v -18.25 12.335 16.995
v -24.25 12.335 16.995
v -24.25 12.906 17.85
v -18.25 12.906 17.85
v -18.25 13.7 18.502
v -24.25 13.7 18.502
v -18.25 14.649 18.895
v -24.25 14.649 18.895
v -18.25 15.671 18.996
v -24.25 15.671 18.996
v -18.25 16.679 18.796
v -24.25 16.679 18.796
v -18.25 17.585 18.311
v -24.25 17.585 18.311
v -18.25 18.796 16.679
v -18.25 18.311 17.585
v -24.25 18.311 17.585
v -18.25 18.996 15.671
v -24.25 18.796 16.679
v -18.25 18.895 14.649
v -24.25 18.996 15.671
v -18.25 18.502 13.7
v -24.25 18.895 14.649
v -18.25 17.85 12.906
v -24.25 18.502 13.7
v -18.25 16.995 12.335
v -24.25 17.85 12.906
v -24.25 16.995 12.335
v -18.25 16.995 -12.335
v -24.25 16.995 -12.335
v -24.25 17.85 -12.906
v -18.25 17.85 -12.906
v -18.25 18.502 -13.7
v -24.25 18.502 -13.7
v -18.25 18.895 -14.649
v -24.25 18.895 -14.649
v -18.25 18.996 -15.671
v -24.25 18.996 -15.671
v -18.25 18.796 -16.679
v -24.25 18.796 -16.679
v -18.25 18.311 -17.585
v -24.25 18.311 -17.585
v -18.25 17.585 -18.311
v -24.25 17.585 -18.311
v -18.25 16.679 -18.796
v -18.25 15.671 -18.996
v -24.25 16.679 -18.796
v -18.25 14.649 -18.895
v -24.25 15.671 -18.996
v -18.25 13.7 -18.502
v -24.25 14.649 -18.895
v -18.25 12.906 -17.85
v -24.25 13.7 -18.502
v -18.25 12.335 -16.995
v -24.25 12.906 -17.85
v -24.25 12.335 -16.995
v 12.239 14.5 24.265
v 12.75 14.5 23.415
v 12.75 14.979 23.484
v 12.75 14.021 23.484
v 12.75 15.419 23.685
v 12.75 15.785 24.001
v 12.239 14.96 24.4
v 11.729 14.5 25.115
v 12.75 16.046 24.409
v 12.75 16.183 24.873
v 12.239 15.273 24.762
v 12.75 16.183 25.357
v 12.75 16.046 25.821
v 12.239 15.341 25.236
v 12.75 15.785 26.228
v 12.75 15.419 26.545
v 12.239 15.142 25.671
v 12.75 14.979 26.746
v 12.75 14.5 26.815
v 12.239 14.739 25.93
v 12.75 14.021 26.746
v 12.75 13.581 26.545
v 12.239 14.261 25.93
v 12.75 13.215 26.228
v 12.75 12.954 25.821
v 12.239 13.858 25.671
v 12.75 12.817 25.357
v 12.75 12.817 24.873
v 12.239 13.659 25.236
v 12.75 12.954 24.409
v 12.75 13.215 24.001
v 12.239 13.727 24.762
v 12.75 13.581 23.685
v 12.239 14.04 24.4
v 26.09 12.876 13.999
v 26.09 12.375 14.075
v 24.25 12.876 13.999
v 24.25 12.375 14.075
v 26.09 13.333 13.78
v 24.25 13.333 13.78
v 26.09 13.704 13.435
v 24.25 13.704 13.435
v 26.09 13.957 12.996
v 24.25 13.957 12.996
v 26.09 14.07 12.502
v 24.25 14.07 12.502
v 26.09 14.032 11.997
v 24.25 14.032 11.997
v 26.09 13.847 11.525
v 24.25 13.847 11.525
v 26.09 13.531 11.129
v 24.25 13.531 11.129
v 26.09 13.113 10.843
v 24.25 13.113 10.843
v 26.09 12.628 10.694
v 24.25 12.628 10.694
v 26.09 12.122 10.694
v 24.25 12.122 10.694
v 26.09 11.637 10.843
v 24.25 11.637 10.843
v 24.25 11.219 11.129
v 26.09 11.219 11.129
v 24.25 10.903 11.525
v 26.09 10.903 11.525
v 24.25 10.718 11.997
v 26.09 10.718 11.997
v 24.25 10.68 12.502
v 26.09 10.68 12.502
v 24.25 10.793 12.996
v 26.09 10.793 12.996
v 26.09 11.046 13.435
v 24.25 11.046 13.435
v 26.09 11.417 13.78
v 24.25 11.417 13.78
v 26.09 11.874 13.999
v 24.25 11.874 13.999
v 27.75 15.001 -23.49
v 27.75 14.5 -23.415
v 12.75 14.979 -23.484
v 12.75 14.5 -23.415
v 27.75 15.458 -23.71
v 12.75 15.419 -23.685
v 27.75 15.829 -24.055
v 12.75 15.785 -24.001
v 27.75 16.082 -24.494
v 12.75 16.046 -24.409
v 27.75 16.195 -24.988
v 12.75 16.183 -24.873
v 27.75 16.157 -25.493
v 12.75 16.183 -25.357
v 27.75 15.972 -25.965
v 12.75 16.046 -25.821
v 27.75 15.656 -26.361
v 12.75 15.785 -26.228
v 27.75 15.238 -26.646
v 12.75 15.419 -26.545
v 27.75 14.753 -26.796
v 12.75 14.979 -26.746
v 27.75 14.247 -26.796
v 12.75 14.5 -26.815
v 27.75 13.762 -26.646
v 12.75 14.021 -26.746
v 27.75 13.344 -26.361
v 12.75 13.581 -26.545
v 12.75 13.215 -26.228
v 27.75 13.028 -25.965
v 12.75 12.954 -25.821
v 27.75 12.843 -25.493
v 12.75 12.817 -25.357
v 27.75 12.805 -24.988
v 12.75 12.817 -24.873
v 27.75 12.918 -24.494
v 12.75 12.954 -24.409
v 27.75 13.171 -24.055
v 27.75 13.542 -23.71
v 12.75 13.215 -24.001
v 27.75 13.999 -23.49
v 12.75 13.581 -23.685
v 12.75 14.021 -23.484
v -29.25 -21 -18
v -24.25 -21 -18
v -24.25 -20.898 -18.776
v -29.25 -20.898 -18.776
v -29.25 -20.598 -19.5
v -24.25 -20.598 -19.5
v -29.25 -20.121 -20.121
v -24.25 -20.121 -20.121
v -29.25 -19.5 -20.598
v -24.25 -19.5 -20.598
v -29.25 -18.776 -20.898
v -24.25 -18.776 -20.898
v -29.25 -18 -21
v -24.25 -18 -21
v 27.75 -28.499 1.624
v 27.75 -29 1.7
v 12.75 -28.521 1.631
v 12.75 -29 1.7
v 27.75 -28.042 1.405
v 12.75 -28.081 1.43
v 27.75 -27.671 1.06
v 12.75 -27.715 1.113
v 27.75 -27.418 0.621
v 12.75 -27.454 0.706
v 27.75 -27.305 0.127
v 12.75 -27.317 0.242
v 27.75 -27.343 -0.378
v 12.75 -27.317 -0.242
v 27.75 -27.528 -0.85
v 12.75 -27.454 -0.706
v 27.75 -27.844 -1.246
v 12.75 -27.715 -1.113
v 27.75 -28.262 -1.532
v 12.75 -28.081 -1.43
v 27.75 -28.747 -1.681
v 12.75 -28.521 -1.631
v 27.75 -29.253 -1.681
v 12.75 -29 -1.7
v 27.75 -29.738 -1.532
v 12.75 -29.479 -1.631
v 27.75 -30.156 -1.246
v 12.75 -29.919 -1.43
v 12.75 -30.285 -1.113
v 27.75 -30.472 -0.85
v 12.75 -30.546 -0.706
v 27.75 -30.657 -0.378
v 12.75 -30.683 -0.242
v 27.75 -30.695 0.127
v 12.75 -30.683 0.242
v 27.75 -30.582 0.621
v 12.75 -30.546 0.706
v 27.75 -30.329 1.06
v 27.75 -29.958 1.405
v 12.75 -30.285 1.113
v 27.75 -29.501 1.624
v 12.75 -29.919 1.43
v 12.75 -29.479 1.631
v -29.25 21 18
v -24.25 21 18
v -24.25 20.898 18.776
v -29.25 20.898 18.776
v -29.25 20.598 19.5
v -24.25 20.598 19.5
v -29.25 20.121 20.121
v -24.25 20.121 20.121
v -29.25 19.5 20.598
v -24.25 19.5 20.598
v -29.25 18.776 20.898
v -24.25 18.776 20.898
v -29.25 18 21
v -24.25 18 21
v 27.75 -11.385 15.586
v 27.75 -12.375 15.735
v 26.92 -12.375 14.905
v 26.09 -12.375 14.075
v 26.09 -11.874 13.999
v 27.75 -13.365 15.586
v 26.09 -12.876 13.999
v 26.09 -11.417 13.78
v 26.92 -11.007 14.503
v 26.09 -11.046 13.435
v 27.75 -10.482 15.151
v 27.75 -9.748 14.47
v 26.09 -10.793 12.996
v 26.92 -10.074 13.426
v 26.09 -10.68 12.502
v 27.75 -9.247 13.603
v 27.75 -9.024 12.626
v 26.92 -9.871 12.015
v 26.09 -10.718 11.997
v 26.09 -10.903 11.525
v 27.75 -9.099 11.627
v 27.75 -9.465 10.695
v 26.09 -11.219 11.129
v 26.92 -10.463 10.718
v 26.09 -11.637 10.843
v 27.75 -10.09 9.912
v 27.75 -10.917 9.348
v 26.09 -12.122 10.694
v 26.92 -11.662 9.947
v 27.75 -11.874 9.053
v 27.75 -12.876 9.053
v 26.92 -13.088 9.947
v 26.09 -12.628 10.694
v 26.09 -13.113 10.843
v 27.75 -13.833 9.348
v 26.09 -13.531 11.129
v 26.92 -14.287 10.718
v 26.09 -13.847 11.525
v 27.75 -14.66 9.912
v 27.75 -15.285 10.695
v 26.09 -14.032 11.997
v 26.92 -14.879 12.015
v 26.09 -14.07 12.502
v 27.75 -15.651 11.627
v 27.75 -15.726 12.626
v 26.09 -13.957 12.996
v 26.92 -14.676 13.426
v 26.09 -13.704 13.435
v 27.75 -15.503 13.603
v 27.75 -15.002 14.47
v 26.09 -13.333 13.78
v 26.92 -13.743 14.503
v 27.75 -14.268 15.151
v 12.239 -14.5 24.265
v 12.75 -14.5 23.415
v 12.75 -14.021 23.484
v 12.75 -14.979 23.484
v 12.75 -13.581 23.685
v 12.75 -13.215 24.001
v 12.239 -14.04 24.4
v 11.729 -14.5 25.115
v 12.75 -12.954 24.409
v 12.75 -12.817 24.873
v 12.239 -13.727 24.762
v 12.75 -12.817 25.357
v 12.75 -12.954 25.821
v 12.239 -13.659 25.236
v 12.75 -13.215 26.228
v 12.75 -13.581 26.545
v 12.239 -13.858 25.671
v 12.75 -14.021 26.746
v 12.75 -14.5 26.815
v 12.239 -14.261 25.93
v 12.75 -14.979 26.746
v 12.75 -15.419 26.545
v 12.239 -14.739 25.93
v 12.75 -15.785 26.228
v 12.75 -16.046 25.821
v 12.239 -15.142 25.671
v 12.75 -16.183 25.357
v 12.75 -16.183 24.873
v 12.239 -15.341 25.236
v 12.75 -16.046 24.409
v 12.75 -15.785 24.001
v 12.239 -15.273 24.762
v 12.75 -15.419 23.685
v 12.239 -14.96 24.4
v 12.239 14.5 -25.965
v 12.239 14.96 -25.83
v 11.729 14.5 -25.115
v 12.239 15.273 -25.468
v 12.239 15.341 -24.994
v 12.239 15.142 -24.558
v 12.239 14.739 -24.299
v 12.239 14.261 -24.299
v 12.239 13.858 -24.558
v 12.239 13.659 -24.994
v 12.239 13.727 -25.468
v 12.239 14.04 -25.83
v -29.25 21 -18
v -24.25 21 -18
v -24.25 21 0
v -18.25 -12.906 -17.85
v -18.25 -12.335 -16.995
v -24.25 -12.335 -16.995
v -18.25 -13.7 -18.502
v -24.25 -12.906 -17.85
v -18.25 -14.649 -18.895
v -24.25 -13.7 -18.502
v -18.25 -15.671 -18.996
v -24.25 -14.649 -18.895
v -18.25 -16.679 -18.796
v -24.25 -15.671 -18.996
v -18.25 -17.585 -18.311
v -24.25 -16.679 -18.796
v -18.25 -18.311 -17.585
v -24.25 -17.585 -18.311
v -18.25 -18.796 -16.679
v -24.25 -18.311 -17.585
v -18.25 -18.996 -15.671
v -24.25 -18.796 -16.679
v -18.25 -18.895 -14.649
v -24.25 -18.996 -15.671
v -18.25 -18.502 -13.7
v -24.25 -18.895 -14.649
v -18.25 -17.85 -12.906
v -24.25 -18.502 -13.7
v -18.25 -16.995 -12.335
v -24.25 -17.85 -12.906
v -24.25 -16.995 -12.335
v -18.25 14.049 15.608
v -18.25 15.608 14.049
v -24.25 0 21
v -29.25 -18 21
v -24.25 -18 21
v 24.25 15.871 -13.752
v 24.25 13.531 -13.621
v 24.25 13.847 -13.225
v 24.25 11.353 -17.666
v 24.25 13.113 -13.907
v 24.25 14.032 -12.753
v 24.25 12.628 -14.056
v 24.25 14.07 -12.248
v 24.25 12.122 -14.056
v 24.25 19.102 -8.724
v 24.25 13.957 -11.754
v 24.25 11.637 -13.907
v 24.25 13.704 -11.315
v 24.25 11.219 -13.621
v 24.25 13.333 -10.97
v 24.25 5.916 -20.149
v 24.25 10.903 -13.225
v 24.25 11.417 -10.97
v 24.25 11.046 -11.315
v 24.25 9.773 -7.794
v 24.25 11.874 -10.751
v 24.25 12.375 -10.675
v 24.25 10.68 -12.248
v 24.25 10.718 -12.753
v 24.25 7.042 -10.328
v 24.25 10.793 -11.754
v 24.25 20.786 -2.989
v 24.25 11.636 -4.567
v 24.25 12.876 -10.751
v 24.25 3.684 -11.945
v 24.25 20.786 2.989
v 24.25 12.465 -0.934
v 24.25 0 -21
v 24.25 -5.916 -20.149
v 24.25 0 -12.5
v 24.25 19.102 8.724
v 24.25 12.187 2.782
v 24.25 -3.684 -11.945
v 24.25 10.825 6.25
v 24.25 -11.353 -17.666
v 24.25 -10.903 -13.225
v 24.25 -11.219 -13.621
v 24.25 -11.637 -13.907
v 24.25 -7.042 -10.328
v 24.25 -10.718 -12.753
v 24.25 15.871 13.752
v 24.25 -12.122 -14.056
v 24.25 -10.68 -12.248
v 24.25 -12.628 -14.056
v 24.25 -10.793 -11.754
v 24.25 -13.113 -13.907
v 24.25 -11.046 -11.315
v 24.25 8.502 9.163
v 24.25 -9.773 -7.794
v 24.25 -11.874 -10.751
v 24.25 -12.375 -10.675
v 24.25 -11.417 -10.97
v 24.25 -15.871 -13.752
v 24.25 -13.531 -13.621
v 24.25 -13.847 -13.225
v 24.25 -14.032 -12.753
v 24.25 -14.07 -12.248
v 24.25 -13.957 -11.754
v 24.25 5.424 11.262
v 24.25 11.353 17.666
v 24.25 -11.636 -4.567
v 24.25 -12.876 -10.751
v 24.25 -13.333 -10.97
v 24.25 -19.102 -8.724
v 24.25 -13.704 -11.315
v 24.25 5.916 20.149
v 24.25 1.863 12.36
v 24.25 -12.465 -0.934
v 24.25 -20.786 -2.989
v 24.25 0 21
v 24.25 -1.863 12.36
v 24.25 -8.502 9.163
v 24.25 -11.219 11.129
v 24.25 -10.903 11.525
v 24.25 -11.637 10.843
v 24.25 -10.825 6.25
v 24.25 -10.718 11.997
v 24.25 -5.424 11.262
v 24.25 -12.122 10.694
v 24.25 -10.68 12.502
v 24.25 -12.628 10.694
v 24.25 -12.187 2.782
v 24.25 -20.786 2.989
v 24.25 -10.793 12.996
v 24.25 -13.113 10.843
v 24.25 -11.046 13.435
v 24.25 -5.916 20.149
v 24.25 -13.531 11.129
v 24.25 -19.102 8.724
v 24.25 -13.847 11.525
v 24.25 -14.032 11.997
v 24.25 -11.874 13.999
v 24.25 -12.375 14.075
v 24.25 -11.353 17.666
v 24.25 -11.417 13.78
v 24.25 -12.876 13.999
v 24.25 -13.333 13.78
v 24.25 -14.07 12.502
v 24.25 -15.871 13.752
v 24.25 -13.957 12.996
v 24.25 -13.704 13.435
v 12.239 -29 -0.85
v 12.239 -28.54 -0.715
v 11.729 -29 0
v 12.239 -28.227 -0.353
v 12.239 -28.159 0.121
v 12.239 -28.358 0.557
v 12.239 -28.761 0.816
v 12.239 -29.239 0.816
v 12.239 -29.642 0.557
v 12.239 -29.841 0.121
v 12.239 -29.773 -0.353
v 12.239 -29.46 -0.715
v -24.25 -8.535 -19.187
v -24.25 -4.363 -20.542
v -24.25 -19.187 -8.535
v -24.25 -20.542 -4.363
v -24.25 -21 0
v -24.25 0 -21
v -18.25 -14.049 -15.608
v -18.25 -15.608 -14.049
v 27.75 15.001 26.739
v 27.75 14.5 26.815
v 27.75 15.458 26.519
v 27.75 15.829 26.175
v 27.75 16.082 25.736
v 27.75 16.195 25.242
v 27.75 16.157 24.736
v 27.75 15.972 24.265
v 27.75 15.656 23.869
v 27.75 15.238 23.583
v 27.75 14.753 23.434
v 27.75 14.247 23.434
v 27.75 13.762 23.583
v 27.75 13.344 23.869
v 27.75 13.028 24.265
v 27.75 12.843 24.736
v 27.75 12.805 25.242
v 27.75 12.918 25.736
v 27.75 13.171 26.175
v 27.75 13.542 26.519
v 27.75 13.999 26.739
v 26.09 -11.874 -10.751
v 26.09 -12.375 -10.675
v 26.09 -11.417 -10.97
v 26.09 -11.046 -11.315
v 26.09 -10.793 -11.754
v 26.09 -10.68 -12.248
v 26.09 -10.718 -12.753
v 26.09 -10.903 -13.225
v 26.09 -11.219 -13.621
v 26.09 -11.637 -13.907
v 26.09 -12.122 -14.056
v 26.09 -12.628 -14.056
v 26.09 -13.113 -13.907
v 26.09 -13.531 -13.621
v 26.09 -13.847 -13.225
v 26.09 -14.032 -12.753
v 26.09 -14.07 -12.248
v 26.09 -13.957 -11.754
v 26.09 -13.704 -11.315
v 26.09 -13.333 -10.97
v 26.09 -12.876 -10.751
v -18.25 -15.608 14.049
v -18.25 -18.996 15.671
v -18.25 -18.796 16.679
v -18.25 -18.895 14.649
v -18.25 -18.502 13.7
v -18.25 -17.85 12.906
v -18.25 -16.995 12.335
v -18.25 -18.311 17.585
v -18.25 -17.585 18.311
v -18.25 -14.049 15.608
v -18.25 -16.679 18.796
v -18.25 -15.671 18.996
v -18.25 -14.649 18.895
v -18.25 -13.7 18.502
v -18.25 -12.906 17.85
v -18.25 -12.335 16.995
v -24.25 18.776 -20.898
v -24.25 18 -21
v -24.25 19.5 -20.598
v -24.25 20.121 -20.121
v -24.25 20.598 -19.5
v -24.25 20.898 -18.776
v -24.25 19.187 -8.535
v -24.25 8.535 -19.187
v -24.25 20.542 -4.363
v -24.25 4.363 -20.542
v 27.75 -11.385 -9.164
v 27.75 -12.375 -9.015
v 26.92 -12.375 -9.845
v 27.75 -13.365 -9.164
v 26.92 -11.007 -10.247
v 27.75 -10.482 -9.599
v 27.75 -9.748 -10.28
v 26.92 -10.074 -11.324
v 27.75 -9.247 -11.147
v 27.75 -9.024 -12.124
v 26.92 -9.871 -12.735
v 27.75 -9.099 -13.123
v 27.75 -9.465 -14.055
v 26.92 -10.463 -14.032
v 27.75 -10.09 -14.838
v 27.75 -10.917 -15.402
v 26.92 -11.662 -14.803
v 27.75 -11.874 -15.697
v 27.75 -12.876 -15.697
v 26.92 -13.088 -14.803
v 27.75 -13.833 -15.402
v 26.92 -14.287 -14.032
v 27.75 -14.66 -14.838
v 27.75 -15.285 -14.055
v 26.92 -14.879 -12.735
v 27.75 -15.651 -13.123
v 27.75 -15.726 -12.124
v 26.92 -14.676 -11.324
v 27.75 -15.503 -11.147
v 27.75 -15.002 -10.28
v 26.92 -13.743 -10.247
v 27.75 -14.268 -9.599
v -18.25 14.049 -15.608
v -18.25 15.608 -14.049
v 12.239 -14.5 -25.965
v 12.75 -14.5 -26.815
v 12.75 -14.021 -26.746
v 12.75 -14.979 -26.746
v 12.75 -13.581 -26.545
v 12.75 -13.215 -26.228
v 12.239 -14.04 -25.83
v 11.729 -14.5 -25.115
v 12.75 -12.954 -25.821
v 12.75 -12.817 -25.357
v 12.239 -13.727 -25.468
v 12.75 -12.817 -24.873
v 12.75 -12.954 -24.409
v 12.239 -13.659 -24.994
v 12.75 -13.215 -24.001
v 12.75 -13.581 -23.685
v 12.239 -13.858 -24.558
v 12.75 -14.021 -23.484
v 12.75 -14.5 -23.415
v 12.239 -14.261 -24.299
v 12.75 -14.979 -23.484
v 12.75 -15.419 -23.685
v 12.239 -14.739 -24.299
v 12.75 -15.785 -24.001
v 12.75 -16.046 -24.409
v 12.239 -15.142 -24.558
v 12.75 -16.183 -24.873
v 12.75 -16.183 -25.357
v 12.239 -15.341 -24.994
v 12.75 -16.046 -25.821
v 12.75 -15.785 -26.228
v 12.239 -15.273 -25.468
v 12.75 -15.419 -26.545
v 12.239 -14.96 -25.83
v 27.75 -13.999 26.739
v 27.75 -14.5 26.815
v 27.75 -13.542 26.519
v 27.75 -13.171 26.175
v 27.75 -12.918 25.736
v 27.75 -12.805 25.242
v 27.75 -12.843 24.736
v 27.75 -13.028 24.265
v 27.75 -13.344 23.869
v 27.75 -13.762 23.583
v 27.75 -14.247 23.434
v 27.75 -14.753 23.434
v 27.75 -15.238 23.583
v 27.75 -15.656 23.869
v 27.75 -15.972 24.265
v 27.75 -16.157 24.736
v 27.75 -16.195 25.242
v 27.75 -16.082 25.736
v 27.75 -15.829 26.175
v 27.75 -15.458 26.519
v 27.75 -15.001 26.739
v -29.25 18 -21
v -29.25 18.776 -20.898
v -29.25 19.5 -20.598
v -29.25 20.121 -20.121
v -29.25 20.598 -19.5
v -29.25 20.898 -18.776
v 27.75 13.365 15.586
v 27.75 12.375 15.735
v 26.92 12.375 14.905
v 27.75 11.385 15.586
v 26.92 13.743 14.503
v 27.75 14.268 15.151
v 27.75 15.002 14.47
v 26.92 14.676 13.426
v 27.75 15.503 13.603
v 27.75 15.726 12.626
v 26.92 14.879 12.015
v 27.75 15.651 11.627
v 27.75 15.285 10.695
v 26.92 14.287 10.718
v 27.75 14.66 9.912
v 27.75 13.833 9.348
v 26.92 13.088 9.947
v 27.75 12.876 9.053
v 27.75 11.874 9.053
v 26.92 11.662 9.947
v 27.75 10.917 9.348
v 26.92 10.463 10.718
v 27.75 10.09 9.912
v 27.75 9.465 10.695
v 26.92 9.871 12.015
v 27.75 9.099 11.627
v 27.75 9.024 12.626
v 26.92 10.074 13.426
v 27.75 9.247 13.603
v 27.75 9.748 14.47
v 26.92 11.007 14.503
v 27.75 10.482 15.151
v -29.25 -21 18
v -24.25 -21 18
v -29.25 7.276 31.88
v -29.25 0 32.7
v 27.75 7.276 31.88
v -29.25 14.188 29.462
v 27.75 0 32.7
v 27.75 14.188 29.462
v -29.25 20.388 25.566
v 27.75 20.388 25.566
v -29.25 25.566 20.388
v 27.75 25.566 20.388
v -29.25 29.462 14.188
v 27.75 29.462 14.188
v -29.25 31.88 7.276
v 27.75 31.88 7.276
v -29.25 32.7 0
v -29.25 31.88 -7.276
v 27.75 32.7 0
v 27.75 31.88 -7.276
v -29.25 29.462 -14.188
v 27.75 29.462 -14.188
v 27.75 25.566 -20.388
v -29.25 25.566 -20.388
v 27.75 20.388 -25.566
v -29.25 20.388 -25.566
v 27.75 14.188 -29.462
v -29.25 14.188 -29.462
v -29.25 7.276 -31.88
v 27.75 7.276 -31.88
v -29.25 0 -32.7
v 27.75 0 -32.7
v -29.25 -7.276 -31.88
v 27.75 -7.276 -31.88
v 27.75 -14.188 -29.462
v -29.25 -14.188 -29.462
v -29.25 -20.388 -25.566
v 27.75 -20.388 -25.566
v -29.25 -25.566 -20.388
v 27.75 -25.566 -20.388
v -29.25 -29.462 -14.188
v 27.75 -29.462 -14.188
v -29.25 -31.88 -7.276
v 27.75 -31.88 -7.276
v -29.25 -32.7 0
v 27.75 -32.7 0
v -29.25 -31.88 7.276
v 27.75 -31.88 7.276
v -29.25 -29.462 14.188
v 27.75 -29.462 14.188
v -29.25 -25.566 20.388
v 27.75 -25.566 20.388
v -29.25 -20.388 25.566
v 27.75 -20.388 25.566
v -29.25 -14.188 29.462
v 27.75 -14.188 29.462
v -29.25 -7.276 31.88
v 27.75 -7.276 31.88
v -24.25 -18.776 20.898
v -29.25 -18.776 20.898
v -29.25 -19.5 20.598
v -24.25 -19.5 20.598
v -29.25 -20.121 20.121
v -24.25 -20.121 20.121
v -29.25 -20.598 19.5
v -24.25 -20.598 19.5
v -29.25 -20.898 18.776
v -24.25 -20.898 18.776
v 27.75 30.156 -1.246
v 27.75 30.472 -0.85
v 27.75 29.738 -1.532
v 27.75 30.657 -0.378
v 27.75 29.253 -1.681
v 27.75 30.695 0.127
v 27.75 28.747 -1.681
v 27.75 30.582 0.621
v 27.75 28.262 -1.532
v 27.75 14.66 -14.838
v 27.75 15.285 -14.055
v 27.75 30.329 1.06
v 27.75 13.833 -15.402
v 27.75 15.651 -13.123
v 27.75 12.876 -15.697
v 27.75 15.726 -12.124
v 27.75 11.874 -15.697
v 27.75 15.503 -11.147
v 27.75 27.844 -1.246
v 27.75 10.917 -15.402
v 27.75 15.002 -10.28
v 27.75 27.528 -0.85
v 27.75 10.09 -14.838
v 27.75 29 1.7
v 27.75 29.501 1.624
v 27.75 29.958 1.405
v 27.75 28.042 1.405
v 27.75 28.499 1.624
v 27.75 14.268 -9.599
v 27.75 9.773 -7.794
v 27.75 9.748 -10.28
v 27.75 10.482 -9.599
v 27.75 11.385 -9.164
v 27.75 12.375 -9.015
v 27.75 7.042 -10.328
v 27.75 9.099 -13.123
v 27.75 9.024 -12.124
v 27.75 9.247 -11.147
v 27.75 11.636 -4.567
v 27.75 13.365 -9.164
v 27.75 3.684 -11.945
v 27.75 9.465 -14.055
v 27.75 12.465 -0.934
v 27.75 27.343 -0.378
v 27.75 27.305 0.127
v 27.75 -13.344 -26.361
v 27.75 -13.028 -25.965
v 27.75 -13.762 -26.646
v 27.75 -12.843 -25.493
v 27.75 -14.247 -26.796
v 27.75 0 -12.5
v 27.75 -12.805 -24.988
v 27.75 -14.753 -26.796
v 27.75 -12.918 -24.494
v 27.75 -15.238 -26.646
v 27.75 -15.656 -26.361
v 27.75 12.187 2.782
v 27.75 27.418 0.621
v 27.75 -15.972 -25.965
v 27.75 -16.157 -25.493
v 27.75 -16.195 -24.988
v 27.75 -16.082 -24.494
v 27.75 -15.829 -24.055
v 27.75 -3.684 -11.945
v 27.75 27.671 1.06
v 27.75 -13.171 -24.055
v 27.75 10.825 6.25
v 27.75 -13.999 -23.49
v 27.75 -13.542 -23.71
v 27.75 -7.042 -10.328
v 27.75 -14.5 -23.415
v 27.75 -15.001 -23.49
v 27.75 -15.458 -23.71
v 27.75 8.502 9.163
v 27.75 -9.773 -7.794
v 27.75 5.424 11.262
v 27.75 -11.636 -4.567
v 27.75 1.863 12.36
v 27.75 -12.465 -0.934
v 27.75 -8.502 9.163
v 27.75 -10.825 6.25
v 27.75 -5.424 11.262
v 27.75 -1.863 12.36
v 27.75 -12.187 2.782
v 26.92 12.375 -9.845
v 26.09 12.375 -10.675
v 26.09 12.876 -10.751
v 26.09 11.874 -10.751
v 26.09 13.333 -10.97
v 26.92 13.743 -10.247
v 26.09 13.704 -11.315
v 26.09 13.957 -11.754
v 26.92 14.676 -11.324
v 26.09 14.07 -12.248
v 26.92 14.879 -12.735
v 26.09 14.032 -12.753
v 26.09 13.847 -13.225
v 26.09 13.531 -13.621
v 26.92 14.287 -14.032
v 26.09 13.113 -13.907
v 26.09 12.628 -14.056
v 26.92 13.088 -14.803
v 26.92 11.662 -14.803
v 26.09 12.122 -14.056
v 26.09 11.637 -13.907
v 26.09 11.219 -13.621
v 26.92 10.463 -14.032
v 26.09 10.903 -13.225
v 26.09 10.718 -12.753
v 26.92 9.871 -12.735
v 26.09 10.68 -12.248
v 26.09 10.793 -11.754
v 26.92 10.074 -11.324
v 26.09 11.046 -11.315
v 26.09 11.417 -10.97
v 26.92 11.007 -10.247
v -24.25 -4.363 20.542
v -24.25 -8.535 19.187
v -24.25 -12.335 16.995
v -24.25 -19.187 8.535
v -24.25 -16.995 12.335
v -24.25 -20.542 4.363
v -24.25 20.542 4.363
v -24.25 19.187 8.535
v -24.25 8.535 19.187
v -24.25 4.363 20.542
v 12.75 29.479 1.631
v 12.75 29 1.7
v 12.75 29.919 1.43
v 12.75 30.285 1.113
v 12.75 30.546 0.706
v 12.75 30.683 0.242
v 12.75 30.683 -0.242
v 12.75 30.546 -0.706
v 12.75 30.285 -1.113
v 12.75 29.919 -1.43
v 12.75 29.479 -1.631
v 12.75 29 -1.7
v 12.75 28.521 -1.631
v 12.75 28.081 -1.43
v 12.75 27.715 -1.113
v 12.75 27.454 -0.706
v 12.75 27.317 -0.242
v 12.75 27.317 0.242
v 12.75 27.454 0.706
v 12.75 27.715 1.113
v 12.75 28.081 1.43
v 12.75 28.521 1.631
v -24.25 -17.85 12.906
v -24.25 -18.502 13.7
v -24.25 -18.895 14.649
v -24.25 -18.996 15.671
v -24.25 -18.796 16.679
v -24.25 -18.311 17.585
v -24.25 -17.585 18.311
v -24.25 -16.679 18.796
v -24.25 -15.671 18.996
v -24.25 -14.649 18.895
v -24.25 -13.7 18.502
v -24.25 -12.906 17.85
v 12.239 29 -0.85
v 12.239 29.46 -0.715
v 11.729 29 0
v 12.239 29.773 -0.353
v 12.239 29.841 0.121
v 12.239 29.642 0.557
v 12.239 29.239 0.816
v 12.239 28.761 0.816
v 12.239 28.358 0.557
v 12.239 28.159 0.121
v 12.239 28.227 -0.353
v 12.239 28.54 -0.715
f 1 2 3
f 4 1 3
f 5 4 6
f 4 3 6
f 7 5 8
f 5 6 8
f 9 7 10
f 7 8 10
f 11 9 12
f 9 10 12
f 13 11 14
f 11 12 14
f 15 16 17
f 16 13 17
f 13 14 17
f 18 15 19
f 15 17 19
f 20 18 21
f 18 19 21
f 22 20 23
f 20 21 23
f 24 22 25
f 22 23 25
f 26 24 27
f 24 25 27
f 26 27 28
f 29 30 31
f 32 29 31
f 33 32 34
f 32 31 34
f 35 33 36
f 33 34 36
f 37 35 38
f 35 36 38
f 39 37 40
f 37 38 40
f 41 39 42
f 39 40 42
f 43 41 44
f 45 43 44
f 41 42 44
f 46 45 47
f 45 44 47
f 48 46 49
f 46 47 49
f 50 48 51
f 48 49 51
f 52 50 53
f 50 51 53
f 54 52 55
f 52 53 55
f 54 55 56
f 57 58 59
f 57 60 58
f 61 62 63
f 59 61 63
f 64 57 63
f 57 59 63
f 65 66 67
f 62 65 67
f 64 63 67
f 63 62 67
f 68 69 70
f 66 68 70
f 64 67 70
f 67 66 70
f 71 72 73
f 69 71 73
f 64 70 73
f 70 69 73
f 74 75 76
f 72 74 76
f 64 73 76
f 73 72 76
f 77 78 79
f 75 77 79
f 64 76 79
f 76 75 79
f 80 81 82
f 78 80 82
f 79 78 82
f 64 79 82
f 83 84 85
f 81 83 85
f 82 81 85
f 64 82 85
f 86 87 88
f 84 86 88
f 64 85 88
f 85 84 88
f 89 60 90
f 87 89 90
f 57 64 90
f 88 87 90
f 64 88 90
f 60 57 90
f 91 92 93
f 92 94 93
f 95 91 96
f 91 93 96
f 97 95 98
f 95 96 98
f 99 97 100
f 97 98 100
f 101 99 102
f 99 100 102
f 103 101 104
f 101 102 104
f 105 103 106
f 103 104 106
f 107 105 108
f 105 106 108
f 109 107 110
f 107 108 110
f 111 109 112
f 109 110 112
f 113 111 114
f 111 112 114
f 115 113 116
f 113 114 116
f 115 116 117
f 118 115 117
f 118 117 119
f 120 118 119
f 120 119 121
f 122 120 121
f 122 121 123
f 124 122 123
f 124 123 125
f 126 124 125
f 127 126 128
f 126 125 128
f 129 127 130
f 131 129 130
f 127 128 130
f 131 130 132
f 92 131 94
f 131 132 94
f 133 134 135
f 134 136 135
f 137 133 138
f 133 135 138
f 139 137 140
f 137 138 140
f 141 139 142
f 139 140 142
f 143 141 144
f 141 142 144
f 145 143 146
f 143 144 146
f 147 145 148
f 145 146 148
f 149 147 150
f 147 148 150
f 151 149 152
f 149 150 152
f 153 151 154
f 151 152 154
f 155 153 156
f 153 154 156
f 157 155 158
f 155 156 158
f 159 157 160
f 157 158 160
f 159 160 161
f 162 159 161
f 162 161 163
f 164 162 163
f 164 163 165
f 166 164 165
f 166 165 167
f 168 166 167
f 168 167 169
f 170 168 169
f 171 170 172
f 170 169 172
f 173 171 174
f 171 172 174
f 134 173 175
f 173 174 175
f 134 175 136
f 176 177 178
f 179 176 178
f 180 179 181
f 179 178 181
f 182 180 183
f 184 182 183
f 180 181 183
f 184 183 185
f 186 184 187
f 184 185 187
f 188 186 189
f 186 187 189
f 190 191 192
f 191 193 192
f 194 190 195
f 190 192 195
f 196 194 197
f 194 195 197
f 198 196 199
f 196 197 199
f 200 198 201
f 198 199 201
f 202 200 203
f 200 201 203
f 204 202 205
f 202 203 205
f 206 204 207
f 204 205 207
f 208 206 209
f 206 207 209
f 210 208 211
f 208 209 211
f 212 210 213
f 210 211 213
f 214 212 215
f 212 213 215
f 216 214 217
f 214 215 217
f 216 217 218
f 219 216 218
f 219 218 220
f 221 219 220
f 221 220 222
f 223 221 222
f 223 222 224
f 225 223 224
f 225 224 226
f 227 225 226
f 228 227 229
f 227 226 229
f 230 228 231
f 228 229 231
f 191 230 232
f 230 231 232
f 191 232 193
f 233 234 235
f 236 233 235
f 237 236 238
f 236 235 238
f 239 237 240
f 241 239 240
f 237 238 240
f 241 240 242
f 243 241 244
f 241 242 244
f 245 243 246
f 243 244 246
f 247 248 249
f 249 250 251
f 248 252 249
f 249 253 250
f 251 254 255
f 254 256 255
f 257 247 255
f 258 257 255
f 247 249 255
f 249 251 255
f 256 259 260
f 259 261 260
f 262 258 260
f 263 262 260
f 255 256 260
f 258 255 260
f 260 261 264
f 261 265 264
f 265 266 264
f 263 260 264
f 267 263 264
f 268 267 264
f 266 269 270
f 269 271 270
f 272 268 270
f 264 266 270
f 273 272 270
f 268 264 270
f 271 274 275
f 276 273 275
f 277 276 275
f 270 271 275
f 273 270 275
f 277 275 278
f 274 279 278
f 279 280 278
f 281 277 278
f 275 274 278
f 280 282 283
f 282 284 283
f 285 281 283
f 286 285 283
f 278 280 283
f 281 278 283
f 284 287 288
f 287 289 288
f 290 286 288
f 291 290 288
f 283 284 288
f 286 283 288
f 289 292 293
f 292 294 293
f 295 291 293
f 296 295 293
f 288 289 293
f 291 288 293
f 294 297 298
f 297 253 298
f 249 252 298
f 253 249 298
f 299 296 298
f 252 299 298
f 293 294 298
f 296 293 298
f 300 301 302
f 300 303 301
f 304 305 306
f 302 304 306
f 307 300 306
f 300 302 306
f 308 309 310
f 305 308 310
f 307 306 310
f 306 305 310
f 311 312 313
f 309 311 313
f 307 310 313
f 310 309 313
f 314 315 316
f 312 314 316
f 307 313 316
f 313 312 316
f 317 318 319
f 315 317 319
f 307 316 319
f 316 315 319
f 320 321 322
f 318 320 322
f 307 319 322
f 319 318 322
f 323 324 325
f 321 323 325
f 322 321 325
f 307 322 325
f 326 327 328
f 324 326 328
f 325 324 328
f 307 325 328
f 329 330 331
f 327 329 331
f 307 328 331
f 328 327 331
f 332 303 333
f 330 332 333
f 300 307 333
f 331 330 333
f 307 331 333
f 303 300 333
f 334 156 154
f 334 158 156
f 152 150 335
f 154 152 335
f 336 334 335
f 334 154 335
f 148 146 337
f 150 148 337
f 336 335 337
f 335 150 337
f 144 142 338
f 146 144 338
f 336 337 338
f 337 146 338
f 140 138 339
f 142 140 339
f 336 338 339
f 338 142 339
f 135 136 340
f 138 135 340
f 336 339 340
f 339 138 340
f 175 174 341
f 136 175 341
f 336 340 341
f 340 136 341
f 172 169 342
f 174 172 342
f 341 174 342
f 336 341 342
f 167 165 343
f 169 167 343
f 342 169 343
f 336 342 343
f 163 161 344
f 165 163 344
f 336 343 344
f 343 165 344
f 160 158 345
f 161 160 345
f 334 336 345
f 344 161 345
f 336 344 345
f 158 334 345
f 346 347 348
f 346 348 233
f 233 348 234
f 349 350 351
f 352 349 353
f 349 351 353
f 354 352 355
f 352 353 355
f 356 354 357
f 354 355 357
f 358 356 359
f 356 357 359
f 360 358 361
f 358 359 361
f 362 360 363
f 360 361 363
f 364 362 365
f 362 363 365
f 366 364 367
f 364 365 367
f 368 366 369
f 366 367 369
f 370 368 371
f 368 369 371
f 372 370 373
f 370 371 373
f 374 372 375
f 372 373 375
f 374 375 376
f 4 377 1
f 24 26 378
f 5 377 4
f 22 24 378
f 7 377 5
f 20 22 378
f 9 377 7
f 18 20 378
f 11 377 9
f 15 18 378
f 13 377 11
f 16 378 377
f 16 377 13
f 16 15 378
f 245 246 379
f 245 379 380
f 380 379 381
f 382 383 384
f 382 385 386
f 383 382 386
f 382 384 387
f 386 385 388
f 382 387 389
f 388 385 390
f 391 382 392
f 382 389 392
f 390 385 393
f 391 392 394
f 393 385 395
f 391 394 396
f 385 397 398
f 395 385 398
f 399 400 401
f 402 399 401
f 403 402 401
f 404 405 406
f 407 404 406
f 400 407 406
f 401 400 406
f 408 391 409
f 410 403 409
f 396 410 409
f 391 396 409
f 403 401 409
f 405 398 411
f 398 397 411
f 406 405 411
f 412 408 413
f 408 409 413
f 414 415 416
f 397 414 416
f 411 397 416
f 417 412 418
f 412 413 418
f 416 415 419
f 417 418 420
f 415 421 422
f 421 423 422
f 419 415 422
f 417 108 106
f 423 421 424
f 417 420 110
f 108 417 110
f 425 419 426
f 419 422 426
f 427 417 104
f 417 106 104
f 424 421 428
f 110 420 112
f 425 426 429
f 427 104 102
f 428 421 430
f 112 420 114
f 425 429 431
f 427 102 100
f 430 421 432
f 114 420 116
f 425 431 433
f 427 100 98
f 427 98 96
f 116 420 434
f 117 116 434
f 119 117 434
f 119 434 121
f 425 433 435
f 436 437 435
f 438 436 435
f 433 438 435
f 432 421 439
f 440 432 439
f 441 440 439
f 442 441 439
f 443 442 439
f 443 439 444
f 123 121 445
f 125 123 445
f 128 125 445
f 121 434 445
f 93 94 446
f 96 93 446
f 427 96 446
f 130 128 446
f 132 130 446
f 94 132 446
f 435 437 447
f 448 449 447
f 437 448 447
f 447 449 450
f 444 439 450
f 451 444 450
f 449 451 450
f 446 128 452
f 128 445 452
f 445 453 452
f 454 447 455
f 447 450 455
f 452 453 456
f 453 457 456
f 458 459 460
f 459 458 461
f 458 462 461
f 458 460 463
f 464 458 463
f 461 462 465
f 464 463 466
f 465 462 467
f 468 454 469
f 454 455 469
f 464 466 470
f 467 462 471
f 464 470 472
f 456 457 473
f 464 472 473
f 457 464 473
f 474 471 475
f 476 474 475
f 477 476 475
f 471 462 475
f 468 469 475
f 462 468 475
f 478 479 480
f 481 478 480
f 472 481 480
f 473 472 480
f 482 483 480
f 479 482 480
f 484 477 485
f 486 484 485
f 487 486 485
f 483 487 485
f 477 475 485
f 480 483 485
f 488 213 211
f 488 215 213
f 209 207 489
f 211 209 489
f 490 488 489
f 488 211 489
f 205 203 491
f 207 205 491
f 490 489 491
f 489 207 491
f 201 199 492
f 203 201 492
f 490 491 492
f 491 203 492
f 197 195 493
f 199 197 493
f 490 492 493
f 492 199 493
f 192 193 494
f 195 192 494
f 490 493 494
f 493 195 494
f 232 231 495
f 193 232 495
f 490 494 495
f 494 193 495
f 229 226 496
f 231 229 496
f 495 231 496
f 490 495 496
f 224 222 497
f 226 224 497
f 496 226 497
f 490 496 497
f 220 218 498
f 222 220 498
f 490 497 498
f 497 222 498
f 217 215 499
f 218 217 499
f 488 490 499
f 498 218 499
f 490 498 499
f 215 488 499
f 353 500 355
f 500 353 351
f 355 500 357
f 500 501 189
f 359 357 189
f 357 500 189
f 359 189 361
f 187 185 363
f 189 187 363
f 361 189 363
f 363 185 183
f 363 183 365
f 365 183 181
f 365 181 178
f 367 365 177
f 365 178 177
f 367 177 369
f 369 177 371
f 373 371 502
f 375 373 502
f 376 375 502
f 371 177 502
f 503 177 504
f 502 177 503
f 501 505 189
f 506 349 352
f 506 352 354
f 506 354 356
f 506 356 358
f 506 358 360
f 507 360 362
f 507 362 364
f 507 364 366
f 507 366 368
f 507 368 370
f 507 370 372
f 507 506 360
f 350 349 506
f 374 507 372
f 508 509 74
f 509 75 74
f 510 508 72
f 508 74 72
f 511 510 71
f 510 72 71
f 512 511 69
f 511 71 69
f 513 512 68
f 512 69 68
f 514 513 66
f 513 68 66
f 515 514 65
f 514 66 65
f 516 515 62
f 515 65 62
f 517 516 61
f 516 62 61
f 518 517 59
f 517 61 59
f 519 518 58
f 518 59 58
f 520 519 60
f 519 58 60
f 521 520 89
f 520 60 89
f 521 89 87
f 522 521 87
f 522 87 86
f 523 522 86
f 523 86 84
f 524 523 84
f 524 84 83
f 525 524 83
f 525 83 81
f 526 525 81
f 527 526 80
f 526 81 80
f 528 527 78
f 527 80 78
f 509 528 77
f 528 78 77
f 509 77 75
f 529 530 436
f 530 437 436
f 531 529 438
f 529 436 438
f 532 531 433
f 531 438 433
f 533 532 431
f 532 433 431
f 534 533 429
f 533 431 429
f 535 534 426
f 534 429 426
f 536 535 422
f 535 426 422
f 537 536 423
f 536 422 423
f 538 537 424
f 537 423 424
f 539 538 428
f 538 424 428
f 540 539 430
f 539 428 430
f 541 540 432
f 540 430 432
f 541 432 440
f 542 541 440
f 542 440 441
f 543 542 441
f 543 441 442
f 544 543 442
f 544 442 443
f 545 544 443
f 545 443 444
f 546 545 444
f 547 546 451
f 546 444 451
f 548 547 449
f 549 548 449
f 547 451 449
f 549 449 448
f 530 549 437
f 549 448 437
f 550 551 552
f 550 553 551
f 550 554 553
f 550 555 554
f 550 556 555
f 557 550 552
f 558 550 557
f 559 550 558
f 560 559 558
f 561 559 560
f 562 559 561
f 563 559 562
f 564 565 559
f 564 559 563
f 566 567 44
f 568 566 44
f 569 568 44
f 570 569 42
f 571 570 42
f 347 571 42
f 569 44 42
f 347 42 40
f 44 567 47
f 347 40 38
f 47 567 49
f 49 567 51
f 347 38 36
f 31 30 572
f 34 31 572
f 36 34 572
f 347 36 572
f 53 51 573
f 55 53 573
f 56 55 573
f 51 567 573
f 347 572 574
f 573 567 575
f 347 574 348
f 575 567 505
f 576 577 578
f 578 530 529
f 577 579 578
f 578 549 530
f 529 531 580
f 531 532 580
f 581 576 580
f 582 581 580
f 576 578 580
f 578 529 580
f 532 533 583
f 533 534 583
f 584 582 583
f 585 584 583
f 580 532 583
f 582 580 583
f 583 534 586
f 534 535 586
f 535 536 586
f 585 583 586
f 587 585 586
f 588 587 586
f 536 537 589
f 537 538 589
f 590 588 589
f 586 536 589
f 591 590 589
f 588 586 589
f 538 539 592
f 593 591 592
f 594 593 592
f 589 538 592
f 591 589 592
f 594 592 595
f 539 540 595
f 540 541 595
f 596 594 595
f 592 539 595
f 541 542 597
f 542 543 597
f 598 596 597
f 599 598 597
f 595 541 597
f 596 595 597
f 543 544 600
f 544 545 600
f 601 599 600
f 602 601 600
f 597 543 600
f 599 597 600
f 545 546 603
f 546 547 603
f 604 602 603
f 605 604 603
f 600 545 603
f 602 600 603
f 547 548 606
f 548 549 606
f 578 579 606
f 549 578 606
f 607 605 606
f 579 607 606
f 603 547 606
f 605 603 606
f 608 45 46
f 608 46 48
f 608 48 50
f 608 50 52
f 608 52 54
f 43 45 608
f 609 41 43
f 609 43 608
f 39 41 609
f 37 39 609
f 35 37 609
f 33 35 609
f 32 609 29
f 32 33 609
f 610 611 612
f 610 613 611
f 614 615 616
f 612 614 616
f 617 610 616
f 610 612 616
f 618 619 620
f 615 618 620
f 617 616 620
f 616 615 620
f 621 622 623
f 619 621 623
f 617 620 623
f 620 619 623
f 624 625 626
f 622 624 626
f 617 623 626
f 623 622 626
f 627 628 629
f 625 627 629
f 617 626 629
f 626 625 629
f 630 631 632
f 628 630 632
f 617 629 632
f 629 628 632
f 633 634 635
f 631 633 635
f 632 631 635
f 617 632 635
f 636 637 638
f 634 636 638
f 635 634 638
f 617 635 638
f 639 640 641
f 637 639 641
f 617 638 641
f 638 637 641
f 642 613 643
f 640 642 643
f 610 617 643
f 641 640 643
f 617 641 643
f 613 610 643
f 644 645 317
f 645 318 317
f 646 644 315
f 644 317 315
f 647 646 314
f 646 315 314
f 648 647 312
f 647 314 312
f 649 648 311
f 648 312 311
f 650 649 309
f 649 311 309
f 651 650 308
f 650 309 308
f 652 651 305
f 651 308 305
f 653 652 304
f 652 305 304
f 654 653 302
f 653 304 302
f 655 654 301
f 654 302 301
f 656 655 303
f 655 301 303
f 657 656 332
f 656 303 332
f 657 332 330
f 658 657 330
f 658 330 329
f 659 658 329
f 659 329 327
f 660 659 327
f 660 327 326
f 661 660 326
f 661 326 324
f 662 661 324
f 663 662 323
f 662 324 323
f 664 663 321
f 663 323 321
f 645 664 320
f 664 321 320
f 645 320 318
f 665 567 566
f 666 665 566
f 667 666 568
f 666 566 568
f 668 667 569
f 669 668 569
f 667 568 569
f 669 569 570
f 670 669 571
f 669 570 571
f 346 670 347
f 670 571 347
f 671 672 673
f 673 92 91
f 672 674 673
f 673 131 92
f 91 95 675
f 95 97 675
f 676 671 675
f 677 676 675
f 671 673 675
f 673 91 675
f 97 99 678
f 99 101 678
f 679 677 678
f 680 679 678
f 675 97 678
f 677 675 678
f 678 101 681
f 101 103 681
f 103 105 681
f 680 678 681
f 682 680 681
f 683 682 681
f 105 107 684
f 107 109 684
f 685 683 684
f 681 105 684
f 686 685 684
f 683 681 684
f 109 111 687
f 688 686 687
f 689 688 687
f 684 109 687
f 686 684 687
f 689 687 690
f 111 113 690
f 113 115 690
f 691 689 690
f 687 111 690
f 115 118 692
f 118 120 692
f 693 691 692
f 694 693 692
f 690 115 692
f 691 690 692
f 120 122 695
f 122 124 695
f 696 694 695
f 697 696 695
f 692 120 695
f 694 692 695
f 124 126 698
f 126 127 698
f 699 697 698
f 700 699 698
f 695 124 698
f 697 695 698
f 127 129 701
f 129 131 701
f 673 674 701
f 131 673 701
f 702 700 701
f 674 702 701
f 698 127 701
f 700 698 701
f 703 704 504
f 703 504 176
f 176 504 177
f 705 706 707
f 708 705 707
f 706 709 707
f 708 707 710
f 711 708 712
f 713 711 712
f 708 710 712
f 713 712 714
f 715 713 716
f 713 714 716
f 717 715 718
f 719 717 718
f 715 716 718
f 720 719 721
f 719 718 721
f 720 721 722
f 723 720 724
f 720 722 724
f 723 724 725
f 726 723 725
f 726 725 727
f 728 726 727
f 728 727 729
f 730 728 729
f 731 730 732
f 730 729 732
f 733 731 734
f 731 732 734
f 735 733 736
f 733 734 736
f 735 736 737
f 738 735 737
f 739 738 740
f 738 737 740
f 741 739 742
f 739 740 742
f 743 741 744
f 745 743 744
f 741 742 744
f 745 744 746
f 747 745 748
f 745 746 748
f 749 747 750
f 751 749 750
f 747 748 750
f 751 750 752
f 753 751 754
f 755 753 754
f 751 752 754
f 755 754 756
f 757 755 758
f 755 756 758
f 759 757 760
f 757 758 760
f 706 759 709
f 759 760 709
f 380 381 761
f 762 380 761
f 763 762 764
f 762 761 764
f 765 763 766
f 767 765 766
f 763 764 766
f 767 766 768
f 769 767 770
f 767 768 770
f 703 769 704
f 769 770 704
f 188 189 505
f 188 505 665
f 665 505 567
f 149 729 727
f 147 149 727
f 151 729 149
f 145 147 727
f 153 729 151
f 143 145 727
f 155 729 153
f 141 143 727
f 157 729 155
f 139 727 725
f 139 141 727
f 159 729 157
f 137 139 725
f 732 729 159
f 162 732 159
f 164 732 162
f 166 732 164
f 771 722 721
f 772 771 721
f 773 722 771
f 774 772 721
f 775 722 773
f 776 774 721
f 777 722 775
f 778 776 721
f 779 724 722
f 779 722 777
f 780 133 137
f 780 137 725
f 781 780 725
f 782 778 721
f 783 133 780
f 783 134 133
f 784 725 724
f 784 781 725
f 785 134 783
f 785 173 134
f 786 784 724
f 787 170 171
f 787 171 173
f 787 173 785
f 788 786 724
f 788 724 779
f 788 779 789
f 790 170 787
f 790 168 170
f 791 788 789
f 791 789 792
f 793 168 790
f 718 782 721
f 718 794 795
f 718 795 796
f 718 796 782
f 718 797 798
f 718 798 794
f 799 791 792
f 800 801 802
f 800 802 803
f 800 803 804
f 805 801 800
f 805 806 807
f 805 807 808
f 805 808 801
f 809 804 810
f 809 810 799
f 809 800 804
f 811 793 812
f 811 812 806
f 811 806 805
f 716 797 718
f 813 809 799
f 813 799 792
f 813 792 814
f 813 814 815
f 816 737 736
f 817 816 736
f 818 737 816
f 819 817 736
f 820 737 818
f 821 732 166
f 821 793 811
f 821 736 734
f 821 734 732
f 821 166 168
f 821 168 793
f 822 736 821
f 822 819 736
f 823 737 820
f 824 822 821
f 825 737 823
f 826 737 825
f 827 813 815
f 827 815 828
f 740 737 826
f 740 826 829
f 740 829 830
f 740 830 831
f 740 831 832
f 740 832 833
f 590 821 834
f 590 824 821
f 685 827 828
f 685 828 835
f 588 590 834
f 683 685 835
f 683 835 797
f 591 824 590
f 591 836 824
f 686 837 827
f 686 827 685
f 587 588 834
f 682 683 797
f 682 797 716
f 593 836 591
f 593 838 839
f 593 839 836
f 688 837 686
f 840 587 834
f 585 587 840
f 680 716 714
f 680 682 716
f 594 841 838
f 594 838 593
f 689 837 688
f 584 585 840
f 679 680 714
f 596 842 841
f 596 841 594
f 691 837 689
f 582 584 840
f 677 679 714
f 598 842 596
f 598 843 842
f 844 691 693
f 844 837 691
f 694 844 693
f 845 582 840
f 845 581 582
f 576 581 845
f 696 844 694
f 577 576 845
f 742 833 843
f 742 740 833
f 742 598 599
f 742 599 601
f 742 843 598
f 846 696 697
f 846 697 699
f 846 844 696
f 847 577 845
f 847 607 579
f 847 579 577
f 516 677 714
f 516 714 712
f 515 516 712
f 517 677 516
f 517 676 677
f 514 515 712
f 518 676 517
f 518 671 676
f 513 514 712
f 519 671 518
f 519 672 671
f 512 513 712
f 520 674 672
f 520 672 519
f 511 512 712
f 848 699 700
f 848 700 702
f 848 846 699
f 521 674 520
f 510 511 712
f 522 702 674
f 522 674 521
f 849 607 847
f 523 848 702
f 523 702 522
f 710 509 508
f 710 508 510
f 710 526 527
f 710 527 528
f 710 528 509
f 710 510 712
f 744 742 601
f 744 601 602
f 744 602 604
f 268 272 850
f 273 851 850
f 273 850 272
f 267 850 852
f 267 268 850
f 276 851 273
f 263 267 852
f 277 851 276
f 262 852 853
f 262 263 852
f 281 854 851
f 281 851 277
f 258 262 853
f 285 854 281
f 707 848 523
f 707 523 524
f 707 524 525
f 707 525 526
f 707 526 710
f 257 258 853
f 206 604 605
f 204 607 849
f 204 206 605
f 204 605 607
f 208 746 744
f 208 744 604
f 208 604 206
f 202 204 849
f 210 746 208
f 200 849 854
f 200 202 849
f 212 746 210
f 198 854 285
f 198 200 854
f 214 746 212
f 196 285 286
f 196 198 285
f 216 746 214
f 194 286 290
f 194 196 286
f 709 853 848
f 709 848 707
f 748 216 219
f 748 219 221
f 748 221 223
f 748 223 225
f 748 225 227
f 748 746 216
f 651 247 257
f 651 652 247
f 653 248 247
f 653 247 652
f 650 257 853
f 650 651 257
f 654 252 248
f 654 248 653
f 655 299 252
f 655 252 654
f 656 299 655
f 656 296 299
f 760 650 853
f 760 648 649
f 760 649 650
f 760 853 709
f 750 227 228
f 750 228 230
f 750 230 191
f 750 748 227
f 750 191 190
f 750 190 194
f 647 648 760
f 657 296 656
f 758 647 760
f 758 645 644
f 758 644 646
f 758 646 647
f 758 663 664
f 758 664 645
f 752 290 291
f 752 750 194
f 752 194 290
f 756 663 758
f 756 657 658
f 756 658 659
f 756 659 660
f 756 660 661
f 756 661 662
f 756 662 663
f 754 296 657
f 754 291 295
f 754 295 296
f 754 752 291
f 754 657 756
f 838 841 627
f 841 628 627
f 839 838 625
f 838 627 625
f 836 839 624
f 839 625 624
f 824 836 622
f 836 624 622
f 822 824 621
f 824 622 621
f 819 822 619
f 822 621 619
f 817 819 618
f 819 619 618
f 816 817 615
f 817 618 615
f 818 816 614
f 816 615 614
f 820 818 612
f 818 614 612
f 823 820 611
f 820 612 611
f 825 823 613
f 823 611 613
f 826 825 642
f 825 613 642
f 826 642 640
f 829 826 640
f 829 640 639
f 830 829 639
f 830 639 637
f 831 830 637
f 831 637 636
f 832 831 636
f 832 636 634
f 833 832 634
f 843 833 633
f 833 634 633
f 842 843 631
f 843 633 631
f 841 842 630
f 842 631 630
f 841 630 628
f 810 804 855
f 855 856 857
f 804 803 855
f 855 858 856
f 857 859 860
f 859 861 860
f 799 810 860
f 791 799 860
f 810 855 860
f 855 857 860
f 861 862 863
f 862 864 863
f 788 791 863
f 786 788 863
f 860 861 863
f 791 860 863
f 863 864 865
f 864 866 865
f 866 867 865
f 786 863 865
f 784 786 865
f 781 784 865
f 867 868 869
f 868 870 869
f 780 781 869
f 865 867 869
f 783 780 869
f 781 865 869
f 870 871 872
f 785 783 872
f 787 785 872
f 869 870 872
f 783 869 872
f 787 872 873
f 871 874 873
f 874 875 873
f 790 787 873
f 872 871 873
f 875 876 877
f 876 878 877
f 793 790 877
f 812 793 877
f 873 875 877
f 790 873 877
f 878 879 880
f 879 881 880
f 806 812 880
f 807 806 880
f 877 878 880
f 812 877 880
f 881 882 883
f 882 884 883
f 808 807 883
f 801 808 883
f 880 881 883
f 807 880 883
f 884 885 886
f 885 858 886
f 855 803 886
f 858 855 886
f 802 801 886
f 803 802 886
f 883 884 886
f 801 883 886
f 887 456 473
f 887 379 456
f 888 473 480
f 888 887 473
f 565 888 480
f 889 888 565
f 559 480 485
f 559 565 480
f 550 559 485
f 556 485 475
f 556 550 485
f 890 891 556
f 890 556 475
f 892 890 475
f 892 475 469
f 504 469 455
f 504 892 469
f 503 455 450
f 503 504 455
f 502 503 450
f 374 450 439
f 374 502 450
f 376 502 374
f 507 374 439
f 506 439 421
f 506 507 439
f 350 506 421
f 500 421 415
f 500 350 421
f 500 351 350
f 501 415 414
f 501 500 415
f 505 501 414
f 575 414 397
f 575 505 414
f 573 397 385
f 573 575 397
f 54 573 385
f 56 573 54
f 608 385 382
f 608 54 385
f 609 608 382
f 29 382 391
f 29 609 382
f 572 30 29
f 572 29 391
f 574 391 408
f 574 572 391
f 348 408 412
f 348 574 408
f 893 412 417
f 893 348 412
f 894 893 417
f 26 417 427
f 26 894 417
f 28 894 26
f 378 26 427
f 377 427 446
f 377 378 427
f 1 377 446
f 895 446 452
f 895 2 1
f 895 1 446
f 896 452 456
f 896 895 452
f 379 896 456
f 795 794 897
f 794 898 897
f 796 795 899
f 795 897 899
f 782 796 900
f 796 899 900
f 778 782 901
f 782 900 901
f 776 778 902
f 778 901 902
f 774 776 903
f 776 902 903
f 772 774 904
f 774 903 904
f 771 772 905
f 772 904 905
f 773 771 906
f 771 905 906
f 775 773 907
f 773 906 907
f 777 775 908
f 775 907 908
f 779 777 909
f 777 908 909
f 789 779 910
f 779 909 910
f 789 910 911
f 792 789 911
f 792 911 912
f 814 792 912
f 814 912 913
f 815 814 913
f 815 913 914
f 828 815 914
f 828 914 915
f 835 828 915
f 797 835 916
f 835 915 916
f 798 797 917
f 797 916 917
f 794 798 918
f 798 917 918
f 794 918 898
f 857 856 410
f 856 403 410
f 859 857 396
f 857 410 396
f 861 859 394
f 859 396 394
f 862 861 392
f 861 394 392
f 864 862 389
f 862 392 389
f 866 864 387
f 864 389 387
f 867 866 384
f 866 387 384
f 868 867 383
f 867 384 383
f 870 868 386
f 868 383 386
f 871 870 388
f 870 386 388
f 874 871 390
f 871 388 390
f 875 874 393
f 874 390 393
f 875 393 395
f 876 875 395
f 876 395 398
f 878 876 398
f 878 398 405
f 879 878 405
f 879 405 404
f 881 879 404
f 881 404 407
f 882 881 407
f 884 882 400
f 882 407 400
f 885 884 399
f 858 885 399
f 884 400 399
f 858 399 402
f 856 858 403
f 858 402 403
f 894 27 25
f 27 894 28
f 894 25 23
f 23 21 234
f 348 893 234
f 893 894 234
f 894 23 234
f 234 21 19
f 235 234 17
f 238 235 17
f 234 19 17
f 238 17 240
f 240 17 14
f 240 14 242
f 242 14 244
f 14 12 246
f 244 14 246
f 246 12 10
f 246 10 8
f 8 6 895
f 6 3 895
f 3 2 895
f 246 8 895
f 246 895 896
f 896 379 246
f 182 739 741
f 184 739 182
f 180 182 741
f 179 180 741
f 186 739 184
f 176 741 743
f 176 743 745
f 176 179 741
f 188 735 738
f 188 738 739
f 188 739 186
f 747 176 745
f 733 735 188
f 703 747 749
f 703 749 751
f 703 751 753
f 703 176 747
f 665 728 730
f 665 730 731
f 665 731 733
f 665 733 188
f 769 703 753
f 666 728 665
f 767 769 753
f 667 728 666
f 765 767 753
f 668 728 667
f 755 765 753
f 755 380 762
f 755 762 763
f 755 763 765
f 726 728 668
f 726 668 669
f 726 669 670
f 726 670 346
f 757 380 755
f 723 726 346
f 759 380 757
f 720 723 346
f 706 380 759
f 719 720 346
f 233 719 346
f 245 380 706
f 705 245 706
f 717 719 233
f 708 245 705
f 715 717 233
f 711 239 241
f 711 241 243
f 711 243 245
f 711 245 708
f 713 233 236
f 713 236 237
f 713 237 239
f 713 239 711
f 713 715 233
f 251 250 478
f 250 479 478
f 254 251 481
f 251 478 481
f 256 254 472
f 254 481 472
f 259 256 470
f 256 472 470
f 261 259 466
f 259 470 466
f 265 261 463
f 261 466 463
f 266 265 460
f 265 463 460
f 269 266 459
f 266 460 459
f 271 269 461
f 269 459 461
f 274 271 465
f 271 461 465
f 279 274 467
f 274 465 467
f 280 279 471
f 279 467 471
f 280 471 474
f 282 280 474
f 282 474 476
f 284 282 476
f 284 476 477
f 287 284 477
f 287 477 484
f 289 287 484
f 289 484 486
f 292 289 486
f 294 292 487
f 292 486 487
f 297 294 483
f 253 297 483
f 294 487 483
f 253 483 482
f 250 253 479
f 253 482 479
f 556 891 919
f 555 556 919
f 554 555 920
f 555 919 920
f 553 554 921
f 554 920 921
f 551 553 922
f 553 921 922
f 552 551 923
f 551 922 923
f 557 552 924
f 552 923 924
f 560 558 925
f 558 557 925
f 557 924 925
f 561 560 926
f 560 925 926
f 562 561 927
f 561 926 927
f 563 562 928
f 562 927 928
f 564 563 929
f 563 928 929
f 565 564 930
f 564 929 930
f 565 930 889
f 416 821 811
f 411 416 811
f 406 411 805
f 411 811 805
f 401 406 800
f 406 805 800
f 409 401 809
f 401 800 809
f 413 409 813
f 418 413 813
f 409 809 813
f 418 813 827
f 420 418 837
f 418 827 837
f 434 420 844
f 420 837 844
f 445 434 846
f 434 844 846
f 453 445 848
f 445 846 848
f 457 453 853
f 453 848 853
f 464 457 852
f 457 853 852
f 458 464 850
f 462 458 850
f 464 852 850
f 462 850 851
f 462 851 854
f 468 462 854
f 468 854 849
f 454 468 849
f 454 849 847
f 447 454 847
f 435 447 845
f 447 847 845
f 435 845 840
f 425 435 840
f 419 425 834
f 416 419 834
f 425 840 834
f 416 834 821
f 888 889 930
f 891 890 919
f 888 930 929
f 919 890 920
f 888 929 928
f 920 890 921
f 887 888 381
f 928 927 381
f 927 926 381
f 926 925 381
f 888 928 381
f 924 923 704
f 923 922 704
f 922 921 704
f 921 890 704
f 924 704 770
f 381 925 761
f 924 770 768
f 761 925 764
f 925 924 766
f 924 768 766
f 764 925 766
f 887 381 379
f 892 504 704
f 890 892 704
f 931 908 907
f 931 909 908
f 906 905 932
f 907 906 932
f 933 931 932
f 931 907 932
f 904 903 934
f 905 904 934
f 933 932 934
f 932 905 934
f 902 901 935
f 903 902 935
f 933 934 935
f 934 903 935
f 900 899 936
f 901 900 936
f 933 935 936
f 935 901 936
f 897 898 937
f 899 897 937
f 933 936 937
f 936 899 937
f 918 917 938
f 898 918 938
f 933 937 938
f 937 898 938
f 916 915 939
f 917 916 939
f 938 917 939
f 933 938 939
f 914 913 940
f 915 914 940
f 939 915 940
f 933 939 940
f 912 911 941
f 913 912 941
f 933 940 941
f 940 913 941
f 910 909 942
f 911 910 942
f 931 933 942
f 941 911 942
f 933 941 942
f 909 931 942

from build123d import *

# Parameters (mm, degrees)
CROQUIS1_R                                           = 32.7
CROQUIS1_R_2                                         = 21
SALIENTE_EXTRUIR1_DEPTH                              = 24.25
SALIENTE_EXTRUIR2_START                              = 3.5
CROQUIS2_R                                           = 32.7
CROQUIS2_R_2                                         = 12.5
SALIENTE_EXTRUIR2_DEPTH                              = 3.5
CROQUIS3_R                                           = 32.7
SALIENTE_EXTRUIR3_DEPTH                              = 5
CROQUIS4_R                                           = 3.5
CORTAR_EXTRUIR1_DEPTH                                = 6
REFRENTADO_PARA_TORNILLO_TAP_N_CON_CABEZ_D           = 3.4
REFRENTADO_PARA_TORNILLO_TAP_N_CON_CABEZ_CSINK_D     = 6.72
REFRENTADO_PARA_TORNILLO_TAP_N_CON_CABEZ_CSINK_ANGLE = 90
TALADRO_DE_MARGEN_PARA_M31_D                         = 3.4
TALADRO_DE_MARGEN_PARA_M31_DEPTH                     = 15
TALADRO_DE_MARGEN_PARA_M31_TIP                       = 1.021463052


with BuildPart() as part:
    # Croquis1 → Saliente-Extruir1 (new, symmetric)
    with BuildSketch(Plane(origin=(0, 0, 0), x_dir=(0, 0, -1), z_dir=(1, 0, 0))):
        with Locations(Location((0, 0, 0), (0, 0, 180))):
            Circle(CROQUIS1_R)
        with Locations(Location((0, 0, 0), (0, 0, 180))):
            Circle(CROQUIS1_R_2, mode=Mode.SUBTRACT)
    extrude(amount=SALIENTE_EXTRUIR1_DEPTH, both=True)

    # Croquis2 → Saliente-Extruir2 (add)
    with BuildSketch(Plane(origin=(24.25, 0, 0), x_dir=(0, 0, -1), z_dir=(1, 0, 0)).offset(SALIENTE_EXTRUIR2_START)):
        with Locations(Location((0, 0, 0), (0, 0, 180))):
            Circle(CROQUIS2_R)
        Circle(CROQUIS2_R_2, mode=Mode.SUBTRACT)
    extrude(amount=-SALIENTE_EXTRUIR2_DEPTH)

    # Croquis3 → Saliente-Extruir3 (add)
    with BuildSketch(Plane.ZY.offset(24.25)):
        Circle(CROQUIS3_R)
        with BuildLine():
            Line((-18, 21), (18, 21))
            ThreePointArc((18, 21), (20.121320344, 20.121320344), (21, 18))
            Line((21, 18), (21, -18))
            ThreePointArc((21, -18), (20.121320344, -20.121320344), (18, -21))
            Line((18, -21), (-18, -21))
            ThreePointArc((-18, -21), (-20.121320344, -20.121320344), (-21, -18))
            Line((-21, -18), (-21, 18))
            ThreePointArc((-21, 18), (-20.121320344, 20.121320344), (-18, 21))
        make_face(mode=Mode.SUBTRACT)
    extrude(amount=SALIENTE_EXTRUIR3_DEPTH)

    # Croquis4 → Cortar-Extruir1 (cut)
    with BuildSketch(Plane.ZY.offset(24.25)):
        with Locations((15.5, 15.5)):
            Circle(CROQUIS4_R)
        with Locations((-15.5, 15.5)):
            Circle(CROQUIS4_R)
        with Locations((-15.5, -15.5)):
            Circle(CROQUIS4_R)
        with Locations((15.5, -15.5)):
            Circle(CROQUIS4_R)
    extrude(amount=-CORTAR_EXTRUIR1_DEPTH, mode=Mode.SUBTRACT)

    # Refrentado para tornillo tapón con cabeza plana de clavija de M32 (through all)
    with Locations(Plane(origin=(27.75, 0, 0), x_dir=(0, 0, -1), z_dir=(1, 0, 0))):
        with Locations((12.375, 12.375), (-12.375, -12.375), (-12.375, 12.375), (12.375, -12.375)):
            CounterSinkHole(REFRENTADO_PARA_TORNILLO_TAP_N_CON_CABEZ_D / 2, REFRENTADO_PARA_TORNILLO_TAP_N_CON_CABEZ_CSINK_D / 2, counter_sink_angle=REFRENTADO_PARA_TORNILLO_TAP_N_CON_CABEZ_CSINK_ANGLE)

    # Taladro de margen para M31
    with Locations(Plane(origin=(27.75, 0, 0), x_dir=(0, 0, -1), z_dir=(1, 0, 0))):
        with Locations((0, 29), (25.11473671, 14.5), (25.11473671, -14.5), (0, -29), (-25.11473671, -14.5), (-25.11473671, 14.5)):
            Hole(TALADRO_DE_MARGEN_PARA_M31_D / 2, depth=TALADRO_DE_MARGEN_PARA_M31_DEPTH)
            with Locations((0, 0, -(TALADRO_DE_MARGEN_PARA_M31_DEPTH + TALADRO_DE_MARGEN_PARA_M31_TIP / 2))):  # 118° drill point
                Cone(0, TALADRO_DE_MARGEN_PARA_M31_D / 2, TALADRO_DE_MARGEN_PARA_M31_TIP, mode=Mode.SUBTRACT)


solid = part.part
